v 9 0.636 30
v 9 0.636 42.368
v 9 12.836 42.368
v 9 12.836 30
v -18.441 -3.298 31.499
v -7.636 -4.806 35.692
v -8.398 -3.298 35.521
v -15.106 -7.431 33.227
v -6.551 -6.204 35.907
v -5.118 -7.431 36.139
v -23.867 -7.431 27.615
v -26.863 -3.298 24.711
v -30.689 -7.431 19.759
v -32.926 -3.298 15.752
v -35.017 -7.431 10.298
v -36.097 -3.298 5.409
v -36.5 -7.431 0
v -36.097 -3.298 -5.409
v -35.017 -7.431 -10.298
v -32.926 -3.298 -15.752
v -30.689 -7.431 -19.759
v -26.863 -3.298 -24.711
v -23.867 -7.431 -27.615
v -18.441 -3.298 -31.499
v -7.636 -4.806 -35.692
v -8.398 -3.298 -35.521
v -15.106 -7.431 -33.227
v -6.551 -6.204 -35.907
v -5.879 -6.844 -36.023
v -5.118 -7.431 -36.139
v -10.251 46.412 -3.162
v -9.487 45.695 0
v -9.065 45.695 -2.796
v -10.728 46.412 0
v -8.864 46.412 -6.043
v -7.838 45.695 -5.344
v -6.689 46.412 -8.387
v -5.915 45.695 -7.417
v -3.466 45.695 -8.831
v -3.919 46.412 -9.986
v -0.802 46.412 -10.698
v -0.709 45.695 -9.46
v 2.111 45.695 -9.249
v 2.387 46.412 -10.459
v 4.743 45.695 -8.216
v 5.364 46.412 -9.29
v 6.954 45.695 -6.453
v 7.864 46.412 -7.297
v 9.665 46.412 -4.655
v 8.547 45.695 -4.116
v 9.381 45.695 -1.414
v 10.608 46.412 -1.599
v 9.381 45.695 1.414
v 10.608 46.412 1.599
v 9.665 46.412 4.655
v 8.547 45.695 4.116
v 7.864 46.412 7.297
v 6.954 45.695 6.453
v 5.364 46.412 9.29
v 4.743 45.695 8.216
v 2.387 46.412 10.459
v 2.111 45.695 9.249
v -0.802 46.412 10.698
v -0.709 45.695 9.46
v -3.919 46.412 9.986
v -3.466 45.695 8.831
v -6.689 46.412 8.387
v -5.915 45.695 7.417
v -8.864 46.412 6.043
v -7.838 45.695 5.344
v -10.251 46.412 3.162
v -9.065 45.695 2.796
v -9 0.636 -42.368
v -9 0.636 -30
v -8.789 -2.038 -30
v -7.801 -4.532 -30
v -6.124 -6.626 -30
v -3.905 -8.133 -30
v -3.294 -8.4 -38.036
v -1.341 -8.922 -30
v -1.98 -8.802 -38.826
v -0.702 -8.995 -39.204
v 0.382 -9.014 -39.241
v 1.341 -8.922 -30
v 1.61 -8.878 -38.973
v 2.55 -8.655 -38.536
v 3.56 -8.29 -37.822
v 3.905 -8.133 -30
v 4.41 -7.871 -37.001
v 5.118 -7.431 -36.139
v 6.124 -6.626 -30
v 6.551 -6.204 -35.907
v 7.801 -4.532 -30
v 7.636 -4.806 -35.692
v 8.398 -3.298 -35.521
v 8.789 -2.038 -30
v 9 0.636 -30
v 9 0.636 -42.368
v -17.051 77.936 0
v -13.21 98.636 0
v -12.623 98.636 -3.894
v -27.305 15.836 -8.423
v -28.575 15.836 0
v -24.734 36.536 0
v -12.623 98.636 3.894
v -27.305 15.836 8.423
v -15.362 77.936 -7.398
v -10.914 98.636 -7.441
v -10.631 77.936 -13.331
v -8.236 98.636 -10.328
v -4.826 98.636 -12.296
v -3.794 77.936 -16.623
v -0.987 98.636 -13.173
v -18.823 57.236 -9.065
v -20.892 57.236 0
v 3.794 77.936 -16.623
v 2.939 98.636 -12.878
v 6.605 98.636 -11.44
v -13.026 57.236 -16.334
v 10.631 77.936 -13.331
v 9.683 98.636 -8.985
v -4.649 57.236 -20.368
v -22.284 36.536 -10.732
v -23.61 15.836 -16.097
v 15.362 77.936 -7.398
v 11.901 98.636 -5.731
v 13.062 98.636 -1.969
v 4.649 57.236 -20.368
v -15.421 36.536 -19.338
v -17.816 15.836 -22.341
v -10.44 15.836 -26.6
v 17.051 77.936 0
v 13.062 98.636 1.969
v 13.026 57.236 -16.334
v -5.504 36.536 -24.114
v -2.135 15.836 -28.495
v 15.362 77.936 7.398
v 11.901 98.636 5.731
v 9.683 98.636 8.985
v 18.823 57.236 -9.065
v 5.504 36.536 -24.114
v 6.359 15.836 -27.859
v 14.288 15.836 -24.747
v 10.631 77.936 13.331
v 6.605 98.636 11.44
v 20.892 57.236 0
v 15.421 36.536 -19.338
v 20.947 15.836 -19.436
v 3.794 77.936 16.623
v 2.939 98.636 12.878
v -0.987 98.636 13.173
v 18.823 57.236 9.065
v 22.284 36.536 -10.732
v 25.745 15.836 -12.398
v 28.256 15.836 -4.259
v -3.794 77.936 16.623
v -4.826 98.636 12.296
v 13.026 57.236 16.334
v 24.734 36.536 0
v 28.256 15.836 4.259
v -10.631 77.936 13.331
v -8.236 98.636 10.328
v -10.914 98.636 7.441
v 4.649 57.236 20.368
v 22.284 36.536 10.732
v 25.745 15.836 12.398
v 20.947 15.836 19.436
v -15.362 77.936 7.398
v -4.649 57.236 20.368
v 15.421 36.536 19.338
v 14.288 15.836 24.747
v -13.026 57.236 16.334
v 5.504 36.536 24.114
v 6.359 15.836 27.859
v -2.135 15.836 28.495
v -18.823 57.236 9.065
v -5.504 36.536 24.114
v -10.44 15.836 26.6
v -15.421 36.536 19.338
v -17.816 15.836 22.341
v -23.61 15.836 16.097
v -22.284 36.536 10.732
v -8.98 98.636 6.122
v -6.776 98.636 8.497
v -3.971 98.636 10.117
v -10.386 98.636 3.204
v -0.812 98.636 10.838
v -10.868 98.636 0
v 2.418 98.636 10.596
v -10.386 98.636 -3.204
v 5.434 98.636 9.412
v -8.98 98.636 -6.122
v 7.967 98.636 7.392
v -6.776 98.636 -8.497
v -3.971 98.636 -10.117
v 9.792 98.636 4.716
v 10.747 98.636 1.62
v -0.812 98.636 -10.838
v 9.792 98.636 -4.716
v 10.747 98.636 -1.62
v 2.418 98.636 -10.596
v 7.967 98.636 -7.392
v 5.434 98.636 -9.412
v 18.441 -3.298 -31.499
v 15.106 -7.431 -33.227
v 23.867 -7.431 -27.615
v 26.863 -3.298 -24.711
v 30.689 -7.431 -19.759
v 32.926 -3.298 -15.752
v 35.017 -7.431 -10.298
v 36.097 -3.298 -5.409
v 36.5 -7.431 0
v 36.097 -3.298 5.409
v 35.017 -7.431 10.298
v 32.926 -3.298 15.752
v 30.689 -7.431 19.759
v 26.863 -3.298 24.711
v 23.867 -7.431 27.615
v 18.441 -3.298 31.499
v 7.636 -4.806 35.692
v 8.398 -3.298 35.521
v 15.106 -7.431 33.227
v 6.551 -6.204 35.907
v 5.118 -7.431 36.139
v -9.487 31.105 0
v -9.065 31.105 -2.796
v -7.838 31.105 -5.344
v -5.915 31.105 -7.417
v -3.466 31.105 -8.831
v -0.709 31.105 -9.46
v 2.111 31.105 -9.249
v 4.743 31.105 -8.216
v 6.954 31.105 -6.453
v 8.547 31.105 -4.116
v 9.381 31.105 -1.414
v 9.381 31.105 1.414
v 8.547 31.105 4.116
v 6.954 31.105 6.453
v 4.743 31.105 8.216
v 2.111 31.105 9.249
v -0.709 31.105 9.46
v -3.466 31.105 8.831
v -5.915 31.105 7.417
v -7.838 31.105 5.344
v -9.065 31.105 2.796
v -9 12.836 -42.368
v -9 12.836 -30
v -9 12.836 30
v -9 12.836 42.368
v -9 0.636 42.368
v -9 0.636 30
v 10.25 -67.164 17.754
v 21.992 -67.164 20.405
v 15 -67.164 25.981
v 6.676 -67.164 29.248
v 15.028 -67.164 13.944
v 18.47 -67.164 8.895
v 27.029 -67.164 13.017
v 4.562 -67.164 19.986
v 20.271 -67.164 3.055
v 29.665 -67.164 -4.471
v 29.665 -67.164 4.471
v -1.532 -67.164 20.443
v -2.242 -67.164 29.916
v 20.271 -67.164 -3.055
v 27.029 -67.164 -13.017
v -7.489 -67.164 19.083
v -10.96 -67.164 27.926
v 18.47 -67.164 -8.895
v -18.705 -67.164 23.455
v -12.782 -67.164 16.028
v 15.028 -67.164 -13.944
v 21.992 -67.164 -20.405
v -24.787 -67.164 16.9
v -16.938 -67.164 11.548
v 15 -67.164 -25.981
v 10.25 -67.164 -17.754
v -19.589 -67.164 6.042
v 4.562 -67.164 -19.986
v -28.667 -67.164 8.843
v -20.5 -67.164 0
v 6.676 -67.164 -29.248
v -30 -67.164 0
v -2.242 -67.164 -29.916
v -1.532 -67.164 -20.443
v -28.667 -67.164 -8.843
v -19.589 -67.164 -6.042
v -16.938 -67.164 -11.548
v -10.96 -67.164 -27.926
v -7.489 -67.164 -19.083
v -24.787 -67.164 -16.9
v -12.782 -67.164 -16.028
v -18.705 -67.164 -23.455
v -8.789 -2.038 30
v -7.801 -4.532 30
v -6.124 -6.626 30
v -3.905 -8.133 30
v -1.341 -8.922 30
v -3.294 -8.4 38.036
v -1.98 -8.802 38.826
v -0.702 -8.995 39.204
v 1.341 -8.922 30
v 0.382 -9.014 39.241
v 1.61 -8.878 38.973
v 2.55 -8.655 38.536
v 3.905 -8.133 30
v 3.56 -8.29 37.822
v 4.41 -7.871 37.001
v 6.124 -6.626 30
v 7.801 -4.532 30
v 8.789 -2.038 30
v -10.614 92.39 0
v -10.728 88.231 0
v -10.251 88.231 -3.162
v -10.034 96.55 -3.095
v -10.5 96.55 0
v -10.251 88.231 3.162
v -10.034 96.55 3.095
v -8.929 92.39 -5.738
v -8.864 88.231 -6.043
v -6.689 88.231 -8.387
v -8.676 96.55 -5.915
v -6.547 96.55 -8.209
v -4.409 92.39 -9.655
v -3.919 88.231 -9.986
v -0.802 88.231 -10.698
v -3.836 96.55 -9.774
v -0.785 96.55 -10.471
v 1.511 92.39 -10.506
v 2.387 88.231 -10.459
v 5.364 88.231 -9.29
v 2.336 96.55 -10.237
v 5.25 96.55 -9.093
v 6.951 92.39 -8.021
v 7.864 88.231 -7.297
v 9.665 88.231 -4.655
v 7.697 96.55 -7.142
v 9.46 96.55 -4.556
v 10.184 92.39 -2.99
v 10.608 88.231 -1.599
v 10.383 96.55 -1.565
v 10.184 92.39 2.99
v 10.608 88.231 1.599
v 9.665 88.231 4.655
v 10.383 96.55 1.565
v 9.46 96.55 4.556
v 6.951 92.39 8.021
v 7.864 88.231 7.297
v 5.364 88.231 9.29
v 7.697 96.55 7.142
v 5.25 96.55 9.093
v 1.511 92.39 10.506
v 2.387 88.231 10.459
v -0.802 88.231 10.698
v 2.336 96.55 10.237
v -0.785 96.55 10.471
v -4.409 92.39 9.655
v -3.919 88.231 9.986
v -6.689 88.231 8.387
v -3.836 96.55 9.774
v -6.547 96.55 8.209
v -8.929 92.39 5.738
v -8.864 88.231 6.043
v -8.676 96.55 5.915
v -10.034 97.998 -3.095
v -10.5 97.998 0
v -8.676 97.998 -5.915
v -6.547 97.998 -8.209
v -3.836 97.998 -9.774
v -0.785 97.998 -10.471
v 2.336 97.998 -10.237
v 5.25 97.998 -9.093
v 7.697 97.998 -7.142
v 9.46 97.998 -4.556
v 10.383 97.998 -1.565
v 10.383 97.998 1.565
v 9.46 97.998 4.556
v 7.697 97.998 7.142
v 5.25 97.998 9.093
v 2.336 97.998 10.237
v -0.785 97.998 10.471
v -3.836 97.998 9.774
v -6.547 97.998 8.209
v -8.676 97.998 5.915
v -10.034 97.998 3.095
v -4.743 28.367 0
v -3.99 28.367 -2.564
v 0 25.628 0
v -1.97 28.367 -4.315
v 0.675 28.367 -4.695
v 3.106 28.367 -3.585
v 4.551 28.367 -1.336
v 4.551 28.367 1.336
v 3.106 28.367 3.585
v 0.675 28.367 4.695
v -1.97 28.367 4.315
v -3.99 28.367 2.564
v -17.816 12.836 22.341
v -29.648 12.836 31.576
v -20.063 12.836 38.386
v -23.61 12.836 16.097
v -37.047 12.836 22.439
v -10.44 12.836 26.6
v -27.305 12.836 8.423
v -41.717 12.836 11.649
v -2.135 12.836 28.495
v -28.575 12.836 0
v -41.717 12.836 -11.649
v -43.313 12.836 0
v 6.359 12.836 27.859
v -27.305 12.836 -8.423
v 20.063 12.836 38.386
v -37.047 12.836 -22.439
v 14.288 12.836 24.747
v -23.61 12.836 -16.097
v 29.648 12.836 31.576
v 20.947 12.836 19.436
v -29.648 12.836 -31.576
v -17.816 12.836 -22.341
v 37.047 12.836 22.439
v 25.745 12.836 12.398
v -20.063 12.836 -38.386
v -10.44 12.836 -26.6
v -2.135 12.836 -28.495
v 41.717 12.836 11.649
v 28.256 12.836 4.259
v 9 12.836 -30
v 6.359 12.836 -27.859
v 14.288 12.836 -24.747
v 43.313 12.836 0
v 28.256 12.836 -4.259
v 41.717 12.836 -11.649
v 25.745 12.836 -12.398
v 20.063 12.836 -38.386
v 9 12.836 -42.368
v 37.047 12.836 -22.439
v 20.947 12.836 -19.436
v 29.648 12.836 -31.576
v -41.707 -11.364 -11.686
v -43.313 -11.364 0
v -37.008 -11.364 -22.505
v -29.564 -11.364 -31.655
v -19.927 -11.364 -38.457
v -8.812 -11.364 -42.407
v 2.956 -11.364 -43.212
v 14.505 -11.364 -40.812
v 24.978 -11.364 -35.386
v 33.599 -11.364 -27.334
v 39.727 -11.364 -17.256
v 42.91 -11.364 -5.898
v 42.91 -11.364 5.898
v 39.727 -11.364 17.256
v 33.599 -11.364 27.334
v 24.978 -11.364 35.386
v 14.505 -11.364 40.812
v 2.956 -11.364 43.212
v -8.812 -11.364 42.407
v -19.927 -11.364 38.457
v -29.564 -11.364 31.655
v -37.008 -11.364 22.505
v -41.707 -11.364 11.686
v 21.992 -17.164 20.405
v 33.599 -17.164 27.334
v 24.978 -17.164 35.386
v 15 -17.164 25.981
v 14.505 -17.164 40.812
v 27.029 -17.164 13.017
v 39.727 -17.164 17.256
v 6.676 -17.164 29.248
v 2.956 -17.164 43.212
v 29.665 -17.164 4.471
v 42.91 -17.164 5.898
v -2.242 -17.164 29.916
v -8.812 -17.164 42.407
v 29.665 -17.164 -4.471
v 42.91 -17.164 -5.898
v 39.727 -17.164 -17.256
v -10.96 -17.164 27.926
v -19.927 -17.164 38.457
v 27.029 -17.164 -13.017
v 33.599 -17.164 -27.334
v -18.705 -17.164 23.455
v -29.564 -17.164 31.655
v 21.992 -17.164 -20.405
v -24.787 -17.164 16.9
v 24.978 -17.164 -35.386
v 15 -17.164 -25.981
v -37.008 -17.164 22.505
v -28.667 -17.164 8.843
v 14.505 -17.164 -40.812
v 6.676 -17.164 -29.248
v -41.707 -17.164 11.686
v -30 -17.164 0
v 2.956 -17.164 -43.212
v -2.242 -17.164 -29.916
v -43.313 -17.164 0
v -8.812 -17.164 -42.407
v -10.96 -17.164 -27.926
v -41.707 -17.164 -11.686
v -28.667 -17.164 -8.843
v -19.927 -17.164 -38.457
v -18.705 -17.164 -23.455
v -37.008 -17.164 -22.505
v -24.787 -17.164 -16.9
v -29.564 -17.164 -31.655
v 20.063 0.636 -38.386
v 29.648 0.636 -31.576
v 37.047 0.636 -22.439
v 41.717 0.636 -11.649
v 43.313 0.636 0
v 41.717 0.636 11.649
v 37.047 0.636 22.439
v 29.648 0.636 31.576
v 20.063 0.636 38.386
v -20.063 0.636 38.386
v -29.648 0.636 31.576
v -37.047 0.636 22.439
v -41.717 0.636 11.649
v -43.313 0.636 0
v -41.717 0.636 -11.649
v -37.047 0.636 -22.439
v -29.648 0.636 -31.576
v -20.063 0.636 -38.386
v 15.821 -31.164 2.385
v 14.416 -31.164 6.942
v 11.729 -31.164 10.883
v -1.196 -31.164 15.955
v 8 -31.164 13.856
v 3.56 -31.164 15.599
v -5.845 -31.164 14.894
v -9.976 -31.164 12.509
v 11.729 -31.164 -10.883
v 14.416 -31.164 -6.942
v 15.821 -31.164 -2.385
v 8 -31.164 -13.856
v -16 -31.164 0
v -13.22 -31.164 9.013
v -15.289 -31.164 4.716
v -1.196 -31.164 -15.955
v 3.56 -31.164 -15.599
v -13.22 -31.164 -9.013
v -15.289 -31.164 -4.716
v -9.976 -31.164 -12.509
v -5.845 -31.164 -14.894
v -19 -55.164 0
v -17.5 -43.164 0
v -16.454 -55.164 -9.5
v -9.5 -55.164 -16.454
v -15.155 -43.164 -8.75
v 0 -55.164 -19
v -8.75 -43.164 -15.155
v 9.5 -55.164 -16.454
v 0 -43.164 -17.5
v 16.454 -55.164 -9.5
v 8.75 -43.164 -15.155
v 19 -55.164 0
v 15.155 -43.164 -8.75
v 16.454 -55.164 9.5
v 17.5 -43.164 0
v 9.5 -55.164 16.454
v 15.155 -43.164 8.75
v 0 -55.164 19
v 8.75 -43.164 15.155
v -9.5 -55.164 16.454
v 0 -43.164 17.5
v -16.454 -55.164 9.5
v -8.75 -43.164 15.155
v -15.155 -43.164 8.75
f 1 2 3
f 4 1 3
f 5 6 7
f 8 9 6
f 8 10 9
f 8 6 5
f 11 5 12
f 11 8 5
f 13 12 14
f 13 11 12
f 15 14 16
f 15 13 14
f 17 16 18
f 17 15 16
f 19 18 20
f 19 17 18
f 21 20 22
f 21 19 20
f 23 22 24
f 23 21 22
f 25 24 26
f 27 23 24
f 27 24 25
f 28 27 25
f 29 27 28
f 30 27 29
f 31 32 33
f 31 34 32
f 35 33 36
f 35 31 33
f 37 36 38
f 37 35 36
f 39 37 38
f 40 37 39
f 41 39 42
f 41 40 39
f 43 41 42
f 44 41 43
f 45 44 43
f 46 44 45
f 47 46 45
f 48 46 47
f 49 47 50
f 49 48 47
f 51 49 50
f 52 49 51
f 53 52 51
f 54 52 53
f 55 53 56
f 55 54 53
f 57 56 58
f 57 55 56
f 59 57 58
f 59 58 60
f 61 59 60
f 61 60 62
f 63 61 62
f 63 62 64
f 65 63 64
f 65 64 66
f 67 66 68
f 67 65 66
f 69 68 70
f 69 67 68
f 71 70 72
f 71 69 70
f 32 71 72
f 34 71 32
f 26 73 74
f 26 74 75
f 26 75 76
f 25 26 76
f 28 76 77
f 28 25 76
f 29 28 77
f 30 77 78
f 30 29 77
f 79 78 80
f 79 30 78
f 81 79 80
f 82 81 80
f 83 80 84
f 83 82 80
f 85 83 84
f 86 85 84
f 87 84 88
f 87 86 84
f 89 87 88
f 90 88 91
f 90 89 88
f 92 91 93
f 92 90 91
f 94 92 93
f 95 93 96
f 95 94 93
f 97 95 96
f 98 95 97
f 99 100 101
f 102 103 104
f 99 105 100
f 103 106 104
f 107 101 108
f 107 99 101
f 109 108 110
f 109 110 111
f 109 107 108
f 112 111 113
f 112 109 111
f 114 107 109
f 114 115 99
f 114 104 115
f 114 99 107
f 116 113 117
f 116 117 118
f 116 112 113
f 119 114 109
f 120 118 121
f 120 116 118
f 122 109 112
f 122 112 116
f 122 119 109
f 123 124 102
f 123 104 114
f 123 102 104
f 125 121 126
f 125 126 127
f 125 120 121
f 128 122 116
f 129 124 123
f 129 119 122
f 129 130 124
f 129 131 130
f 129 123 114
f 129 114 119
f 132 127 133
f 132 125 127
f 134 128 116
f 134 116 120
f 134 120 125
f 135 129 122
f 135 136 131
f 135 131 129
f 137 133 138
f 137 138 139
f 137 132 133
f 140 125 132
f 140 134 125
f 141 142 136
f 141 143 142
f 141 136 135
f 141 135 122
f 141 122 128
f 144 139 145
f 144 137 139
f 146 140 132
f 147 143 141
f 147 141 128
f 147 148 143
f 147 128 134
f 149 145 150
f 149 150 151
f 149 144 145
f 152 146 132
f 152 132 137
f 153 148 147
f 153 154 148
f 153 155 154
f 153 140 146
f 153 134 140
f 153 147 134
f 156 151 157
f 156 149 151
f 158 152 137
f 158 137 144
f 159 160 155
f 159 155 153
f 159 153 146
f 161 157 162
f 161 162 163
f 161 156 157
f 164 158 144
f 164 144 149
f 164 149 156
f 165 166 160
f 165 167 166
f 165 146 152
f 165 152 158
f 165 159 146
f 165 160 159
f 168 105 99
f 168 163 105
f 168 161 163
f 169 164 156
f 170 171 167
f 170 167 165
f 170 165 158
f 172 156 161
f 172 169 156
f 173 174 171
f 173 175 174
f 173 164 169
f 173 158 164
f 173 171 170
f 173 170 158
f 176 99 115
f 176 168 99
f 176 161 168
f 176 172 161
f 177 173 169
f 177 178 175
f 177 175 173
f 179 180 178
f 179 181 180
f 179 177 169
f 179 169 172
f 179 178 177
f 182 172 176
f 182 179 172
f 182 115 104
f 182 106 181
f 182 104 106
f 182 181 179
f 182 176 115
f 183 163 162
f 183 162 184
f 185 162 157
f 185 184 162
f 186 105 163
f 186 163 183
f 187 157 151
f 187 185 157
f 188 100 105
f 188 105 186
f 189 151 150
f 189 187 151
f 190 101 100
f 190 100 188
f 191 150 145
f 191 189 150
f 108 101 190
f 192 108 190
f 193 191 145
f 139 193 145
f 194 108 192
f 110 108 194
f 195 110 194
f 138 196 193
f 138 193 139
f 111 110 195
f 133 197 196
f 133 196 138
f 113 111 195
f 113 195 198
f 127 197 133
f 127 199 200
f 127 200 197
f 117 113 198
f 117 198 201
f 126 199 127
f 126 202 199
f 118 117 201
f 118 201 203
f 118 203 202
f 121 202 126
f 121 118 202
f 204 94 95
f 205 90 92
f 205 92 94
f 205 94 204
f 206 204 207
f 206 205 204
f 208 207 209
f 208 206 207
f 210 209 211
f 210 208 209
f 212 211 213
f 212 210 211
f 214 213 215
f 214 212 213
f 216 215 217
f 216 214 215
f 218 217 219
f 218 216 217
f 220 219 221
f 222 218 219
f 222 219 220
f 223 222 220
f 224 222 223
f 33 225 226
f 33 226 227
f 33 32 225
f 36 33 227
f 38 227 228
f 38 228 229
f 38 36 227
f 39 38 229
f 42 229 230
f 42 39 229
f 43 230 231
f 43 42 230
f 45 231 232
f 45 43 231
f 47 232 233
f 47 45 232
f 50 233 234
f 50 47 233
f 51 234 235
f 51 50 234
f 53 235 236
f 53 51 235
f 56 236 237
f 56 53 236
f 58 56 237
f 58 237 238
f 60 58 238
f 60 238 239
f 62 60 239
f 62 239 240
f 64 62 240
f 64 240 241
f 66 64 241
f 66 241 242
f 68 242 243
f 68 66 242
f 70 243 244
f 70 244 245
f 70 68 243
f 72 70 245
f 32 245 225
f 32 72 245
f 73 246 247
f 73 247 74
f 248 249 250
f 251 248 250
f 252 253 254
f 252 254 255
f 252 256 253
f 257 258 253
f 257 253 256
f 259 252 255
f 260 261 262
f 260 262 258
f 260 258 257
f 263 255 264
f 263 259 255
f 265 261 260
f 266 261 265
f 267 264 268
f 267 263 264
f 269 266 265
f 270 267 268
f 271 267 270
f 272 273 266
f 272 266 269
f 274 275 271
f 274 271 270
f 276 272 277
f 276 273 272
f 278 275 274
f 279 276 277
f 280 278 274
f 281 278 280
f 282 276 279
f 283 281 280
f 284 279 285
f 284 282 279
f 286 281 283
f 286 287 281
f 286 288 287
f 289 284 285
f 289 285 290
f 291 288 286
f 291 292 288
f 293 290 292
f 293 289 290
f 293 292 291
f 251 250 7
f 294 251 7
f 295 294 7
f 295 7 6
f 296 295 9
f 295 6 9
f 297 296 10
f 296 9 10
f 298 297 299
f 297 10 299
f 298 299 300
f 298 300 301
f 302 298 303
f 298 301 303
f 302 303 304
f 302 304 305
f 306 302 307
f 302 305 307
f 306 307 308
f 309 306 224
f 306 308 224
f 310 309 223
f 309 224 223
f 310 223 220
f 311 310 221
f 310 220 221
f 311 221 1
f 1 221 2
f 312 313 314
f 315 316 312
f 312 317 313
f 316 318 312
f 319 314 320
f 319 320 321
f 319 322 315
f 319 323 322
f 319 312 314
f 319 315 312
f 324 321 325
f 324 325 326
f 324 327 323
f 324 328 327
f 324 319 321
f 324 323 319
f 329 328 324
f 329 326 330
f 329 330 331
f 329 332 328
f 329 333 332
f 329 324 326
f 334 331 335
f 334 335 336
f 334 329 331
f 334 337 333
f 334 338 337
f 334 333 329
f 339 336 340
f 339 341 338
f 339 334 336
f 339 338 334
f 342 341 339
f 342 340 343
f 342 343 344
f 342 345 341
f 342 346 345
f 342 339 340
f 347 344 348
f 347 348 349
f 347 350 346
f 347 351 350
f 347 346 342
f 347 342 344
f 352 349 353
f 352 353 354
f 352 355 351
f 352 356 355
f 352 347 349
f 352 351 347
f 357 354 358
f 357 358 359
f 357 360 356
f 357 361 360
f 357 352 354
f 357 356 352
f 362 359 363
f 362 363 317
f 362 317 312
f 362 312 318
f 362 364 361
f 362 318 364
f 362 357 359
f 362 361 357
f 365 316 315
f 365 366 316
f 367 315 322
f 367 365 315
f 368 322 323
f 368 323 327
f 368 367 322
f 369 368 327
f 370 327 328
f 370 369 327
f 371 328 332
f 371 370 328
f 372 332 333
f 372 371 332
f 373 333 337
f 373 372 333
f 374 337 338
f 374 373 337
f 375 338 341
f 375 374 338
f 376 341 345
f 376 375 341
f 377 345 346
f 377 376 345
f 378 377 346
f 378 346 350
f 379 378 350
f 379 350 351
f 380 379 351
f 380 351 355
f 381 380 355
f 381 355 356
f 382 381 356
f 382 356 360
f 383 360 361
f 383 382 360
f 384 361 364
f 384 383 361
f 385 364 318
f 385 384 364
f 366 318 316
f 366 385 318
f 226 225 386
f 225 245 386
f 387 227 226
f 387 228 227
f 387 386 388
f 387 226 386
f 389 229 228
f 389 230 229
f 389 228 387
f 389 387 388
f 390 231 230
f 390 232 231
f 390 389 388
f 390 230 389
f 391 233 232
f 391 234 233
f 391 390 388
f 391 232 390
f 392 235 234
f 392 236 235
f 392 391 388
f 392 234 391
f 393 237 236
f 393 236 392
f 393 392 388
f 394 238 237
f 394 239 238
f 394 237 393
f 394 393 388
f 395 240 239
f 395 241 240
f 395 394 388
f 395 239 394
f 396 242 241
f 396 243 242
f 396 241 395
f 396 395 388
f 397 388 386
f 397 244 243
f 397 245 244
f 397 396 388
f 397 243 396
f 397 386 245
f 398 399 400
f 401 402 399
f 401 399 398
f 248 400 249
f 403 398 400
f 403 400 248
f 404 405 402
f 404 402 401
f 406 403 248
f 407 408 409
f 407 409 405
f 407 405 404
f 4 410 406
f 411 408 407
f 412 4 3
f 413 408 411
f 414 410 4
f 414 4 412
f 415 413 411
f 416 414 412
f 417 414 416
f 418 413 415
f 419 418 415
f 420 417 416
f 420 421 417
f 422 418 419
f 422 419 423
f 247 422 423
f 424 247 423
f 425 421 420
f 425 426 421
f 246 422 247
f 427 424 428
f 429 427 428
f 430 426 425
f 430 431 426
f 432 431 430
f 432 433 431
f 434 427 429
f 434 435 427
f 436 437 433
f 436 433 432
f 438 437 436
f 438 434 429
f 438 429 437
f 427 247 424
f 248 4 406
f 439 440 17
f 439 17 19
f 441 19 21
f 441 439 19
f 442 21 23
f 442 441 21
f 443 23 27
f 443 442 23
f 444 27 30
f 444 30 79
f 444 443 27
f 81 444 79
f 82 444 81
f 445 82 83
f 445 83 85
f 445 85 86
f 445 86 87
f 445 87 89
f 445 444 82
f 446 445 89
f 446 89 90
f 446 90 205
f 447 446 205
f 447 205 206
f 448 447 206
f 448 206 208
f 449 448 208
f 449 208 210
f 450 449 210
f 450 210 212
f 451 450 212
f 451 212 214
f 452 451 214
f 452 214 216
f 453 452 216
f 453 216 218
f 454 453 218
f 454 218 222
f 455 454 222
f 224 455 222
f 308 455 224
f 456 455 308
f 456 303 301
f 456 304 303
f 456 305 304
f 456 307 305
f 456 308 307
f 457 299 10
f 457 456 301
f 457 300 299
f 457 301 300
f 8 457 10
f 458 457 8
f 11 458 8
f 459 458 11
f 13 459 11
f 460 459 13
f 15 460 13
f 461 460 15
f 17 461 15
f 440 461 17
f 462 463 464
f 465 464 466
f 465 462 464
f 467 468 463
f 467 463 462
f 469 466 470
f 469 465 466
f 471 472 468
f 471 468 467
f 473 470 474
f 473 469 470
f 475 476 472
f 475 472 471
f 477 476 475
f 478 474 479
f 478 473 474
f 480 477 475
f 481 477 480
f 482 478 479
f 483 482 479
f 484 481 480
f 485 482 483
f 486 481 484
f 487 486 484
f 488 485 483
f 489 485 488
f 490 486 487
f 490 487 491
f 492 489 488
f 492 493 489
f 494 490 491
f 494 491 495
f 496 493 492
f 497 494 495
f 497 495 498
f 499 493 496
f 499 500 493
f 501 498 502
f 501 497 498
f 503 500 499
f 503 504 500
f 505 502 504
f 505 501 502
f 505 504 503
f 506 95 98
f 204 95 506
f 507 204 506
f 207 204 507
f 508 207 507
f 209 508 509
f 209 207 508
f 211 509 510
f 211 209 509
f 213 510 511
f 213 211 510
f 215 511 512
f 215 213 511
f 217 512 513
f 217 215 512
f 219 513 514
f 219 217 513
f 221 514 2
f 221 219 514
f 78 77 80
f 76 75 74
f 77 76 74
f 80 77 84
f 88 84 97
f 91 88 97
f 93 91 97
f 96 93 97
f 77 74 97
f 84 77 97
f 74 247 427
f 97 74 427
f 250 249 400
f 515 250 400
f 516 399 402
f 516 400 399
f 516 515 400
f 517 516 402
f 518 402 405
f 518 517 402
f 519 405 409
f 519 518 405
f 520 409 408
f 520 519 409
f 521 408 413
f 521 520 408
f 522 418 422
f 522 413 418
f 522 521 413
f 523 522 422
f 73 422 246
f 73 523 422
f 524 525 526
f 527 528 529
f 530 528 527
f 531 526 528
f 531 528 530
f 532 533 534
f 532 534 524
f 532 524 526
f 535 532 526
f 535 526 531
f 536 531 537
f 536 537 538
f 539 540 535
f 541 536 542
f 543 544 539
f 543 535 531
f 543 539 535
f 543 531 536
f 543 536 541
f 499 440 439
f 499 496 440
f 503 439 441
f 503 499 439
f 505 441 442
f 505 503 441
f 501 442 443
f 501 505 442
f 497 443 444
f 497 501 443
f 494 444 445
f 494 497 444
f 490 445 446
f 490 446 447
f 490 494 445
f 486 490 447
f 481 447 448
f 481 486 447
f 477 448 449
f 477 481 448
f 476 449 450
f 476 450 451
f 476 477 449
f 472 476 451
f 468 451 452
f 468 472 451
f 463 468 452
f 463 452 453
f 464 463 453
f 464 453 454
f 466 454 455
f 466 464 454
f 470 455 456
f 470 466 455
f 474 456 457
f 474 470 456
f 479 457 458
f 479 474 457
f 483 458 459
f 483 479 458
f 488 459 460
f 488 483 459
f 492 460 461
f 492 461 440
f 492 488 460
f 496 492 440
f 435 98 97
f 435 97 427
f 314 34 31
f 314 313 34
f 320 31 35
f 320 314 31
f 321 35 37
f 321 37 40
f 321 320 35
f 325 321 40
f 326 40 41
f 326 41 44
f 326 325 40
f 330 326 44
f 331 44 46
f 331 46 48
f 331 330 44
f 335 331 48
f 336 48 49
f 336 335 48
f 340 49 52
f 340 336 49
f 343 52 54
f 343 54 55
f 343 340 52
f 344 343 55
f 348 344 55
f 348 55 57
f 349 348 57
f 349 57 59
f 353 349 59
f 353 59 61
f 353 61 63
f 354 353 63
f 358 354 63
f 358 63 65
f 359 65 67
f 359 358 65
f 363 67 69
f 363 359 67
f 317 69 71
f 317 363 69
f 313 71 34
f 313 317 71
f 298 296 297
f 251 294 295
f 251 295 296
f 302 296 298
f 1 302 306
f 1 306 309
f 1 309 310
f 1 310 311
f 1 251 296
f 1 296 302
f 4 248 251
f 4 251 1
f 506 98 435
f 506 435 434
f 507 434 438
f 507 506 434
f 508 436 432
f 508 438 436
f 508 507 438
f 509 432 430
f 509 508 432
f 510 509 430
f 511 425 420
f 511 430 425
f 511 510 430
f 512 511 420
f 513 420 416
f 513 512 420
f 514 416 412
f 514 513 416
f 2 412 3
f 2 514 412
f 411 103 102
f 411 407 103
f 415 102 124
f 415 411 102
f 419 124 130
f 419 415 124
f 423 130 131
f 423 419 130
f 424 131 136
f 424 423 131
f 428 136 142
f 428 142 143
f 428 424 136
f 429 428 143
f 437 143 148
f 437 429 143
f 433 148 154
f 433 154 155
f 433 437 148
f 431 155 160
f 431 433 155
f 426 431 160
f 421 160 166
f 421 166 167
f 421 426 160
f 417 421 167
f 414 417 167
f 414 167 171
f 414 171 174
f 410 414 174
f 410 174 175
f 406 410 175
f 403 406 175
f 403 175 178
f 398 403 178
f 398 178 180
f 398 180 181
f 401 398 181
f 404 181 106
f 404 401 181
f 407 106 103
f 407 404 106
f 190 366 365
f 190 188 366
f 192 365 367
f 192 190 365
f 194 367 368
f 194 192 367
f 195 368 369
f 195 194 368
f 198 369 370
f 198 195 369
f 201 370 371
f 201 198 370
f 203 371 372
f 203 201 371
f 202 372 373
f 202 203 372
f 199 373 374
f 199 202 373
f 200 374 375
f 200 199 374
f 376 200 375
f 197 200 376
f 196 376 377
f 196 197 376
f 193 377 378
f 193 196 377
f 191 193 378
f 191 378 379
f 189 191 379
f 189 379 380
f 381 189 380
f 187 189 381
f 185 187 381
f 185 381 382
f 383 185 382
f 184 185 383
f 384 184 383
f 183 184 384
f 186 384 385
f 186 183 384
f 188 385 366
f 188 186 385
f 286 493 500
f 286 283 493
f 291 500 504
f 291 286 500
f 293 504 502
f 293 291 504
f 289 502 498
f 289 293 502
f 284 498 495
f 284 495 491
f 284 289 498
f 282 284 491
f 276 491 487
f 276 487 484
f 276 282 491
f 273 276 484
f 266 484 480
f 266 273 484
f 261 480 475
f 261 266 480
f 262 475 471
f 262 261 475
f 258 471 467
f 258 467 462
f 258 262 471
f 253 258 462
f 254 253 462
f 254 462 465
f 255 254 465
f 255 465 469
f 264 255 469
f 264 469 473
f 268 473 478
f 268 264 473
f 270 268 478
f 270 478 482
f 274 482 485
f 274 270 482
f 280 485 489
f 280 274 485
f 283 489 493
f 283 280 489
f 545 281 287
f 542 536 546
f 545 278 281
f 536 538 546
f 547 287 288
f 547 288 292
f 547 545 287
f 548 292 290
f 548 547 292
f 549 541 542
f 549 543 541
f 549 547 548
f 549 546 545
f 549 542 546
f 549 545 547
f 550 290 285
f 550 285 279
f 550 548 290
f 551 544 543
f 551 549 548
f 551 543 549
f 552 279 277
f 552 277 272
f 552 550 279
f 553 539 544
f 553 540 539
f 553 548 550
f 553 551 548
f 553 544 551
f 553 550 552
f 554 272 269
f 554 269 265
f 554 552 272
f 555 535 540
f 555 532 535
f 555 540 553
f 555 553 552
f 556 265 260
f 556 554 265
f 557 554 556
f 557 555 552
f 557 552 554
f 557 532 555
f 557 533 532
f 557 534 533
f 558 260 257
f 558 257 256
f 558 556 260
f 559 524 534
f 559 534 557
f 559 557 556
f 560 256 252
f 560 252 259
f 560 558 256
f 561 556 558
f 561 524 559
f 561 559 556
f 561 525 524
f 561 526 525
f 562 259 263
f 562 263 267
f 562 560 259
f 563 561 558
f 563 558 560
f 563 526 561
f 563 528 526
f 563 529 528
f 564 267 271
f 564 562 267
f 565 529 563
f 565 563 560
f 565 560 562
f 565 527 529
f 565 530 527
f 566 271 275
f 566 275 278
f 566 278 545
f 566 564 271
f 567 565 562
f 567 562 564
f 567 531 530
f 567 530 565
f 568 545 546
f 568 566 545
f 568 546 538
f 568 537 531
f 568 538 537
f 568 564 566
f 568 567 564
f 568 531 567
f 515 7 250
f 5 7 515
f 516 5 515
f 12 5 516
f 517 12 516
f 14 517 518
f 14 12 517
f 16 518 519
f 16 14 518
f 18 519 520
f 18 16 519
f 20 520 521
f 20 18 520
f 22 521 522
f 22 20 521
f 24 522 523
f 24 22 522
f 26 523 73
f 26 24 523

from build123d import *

# Parameters (mm, degrees)
CUT_EXTRUDE_1_DEPTH = 20


with BuildPart() as part:
    # 草图1 → 旋转2 (revolve)
    with BuildSketch(Plane.XY):
        Polygon((-10.868417819, 98.635802469), (-13.209567901, 98.635802469), (-28.575, 15.835802469), (-28.575, 12.835802469), (-43.313271605, 12.835802469), (-43.313271605, 0.635802469), (-36.5, -3.297841726), (-36.5, -7.430553336), (-43.313271605, -11.364197531), (-43.313271605, -17.164197531), (-30, -17.164197531), (-30, -67.164197531), (-20.5, -67.164197531), (-16, -31.164197531), (0, -31.164197531), (0, 25.628046603), (-9.486874299, 31.105296033), (-9.486874299, 45.695475602), (-10.727694805, 46.411863655), (-10.727694805, 88.230958782), (-10.5, 96.54970542), (-10.5, 97.997684089), align=None)
    revolve(axis=Axis((0, 104.892592593, 0), (0, -1, 0)))

    # 草图3 → 切除-拉伸1 (cut)
    with BuildSketch(Plane.XY.offset(50)):
        with BuildLine():
            Line((-9, 12.835802469), (-9, 0.635802469))
            ThreePointArc((-9, 0.635802469), (0, -9.022430093), (9, 0.635802469))
            Line((9, 0.635802469), (9, 12.835802469))
            Line((9, 12.835802469), (-9, 12.835802469))
        make_face()
    cut_extrude_1 = extrude(amount=-CUT_EXTRUDE_1_DEPTH, mode=Mode.SUBTRACT)

    # 镜向1: 切除-拉伸1 across plane
    add(cut_extrude_1.mirror(Plane.XY), mode=Mode.SUBTRACT)


solid = part.part
